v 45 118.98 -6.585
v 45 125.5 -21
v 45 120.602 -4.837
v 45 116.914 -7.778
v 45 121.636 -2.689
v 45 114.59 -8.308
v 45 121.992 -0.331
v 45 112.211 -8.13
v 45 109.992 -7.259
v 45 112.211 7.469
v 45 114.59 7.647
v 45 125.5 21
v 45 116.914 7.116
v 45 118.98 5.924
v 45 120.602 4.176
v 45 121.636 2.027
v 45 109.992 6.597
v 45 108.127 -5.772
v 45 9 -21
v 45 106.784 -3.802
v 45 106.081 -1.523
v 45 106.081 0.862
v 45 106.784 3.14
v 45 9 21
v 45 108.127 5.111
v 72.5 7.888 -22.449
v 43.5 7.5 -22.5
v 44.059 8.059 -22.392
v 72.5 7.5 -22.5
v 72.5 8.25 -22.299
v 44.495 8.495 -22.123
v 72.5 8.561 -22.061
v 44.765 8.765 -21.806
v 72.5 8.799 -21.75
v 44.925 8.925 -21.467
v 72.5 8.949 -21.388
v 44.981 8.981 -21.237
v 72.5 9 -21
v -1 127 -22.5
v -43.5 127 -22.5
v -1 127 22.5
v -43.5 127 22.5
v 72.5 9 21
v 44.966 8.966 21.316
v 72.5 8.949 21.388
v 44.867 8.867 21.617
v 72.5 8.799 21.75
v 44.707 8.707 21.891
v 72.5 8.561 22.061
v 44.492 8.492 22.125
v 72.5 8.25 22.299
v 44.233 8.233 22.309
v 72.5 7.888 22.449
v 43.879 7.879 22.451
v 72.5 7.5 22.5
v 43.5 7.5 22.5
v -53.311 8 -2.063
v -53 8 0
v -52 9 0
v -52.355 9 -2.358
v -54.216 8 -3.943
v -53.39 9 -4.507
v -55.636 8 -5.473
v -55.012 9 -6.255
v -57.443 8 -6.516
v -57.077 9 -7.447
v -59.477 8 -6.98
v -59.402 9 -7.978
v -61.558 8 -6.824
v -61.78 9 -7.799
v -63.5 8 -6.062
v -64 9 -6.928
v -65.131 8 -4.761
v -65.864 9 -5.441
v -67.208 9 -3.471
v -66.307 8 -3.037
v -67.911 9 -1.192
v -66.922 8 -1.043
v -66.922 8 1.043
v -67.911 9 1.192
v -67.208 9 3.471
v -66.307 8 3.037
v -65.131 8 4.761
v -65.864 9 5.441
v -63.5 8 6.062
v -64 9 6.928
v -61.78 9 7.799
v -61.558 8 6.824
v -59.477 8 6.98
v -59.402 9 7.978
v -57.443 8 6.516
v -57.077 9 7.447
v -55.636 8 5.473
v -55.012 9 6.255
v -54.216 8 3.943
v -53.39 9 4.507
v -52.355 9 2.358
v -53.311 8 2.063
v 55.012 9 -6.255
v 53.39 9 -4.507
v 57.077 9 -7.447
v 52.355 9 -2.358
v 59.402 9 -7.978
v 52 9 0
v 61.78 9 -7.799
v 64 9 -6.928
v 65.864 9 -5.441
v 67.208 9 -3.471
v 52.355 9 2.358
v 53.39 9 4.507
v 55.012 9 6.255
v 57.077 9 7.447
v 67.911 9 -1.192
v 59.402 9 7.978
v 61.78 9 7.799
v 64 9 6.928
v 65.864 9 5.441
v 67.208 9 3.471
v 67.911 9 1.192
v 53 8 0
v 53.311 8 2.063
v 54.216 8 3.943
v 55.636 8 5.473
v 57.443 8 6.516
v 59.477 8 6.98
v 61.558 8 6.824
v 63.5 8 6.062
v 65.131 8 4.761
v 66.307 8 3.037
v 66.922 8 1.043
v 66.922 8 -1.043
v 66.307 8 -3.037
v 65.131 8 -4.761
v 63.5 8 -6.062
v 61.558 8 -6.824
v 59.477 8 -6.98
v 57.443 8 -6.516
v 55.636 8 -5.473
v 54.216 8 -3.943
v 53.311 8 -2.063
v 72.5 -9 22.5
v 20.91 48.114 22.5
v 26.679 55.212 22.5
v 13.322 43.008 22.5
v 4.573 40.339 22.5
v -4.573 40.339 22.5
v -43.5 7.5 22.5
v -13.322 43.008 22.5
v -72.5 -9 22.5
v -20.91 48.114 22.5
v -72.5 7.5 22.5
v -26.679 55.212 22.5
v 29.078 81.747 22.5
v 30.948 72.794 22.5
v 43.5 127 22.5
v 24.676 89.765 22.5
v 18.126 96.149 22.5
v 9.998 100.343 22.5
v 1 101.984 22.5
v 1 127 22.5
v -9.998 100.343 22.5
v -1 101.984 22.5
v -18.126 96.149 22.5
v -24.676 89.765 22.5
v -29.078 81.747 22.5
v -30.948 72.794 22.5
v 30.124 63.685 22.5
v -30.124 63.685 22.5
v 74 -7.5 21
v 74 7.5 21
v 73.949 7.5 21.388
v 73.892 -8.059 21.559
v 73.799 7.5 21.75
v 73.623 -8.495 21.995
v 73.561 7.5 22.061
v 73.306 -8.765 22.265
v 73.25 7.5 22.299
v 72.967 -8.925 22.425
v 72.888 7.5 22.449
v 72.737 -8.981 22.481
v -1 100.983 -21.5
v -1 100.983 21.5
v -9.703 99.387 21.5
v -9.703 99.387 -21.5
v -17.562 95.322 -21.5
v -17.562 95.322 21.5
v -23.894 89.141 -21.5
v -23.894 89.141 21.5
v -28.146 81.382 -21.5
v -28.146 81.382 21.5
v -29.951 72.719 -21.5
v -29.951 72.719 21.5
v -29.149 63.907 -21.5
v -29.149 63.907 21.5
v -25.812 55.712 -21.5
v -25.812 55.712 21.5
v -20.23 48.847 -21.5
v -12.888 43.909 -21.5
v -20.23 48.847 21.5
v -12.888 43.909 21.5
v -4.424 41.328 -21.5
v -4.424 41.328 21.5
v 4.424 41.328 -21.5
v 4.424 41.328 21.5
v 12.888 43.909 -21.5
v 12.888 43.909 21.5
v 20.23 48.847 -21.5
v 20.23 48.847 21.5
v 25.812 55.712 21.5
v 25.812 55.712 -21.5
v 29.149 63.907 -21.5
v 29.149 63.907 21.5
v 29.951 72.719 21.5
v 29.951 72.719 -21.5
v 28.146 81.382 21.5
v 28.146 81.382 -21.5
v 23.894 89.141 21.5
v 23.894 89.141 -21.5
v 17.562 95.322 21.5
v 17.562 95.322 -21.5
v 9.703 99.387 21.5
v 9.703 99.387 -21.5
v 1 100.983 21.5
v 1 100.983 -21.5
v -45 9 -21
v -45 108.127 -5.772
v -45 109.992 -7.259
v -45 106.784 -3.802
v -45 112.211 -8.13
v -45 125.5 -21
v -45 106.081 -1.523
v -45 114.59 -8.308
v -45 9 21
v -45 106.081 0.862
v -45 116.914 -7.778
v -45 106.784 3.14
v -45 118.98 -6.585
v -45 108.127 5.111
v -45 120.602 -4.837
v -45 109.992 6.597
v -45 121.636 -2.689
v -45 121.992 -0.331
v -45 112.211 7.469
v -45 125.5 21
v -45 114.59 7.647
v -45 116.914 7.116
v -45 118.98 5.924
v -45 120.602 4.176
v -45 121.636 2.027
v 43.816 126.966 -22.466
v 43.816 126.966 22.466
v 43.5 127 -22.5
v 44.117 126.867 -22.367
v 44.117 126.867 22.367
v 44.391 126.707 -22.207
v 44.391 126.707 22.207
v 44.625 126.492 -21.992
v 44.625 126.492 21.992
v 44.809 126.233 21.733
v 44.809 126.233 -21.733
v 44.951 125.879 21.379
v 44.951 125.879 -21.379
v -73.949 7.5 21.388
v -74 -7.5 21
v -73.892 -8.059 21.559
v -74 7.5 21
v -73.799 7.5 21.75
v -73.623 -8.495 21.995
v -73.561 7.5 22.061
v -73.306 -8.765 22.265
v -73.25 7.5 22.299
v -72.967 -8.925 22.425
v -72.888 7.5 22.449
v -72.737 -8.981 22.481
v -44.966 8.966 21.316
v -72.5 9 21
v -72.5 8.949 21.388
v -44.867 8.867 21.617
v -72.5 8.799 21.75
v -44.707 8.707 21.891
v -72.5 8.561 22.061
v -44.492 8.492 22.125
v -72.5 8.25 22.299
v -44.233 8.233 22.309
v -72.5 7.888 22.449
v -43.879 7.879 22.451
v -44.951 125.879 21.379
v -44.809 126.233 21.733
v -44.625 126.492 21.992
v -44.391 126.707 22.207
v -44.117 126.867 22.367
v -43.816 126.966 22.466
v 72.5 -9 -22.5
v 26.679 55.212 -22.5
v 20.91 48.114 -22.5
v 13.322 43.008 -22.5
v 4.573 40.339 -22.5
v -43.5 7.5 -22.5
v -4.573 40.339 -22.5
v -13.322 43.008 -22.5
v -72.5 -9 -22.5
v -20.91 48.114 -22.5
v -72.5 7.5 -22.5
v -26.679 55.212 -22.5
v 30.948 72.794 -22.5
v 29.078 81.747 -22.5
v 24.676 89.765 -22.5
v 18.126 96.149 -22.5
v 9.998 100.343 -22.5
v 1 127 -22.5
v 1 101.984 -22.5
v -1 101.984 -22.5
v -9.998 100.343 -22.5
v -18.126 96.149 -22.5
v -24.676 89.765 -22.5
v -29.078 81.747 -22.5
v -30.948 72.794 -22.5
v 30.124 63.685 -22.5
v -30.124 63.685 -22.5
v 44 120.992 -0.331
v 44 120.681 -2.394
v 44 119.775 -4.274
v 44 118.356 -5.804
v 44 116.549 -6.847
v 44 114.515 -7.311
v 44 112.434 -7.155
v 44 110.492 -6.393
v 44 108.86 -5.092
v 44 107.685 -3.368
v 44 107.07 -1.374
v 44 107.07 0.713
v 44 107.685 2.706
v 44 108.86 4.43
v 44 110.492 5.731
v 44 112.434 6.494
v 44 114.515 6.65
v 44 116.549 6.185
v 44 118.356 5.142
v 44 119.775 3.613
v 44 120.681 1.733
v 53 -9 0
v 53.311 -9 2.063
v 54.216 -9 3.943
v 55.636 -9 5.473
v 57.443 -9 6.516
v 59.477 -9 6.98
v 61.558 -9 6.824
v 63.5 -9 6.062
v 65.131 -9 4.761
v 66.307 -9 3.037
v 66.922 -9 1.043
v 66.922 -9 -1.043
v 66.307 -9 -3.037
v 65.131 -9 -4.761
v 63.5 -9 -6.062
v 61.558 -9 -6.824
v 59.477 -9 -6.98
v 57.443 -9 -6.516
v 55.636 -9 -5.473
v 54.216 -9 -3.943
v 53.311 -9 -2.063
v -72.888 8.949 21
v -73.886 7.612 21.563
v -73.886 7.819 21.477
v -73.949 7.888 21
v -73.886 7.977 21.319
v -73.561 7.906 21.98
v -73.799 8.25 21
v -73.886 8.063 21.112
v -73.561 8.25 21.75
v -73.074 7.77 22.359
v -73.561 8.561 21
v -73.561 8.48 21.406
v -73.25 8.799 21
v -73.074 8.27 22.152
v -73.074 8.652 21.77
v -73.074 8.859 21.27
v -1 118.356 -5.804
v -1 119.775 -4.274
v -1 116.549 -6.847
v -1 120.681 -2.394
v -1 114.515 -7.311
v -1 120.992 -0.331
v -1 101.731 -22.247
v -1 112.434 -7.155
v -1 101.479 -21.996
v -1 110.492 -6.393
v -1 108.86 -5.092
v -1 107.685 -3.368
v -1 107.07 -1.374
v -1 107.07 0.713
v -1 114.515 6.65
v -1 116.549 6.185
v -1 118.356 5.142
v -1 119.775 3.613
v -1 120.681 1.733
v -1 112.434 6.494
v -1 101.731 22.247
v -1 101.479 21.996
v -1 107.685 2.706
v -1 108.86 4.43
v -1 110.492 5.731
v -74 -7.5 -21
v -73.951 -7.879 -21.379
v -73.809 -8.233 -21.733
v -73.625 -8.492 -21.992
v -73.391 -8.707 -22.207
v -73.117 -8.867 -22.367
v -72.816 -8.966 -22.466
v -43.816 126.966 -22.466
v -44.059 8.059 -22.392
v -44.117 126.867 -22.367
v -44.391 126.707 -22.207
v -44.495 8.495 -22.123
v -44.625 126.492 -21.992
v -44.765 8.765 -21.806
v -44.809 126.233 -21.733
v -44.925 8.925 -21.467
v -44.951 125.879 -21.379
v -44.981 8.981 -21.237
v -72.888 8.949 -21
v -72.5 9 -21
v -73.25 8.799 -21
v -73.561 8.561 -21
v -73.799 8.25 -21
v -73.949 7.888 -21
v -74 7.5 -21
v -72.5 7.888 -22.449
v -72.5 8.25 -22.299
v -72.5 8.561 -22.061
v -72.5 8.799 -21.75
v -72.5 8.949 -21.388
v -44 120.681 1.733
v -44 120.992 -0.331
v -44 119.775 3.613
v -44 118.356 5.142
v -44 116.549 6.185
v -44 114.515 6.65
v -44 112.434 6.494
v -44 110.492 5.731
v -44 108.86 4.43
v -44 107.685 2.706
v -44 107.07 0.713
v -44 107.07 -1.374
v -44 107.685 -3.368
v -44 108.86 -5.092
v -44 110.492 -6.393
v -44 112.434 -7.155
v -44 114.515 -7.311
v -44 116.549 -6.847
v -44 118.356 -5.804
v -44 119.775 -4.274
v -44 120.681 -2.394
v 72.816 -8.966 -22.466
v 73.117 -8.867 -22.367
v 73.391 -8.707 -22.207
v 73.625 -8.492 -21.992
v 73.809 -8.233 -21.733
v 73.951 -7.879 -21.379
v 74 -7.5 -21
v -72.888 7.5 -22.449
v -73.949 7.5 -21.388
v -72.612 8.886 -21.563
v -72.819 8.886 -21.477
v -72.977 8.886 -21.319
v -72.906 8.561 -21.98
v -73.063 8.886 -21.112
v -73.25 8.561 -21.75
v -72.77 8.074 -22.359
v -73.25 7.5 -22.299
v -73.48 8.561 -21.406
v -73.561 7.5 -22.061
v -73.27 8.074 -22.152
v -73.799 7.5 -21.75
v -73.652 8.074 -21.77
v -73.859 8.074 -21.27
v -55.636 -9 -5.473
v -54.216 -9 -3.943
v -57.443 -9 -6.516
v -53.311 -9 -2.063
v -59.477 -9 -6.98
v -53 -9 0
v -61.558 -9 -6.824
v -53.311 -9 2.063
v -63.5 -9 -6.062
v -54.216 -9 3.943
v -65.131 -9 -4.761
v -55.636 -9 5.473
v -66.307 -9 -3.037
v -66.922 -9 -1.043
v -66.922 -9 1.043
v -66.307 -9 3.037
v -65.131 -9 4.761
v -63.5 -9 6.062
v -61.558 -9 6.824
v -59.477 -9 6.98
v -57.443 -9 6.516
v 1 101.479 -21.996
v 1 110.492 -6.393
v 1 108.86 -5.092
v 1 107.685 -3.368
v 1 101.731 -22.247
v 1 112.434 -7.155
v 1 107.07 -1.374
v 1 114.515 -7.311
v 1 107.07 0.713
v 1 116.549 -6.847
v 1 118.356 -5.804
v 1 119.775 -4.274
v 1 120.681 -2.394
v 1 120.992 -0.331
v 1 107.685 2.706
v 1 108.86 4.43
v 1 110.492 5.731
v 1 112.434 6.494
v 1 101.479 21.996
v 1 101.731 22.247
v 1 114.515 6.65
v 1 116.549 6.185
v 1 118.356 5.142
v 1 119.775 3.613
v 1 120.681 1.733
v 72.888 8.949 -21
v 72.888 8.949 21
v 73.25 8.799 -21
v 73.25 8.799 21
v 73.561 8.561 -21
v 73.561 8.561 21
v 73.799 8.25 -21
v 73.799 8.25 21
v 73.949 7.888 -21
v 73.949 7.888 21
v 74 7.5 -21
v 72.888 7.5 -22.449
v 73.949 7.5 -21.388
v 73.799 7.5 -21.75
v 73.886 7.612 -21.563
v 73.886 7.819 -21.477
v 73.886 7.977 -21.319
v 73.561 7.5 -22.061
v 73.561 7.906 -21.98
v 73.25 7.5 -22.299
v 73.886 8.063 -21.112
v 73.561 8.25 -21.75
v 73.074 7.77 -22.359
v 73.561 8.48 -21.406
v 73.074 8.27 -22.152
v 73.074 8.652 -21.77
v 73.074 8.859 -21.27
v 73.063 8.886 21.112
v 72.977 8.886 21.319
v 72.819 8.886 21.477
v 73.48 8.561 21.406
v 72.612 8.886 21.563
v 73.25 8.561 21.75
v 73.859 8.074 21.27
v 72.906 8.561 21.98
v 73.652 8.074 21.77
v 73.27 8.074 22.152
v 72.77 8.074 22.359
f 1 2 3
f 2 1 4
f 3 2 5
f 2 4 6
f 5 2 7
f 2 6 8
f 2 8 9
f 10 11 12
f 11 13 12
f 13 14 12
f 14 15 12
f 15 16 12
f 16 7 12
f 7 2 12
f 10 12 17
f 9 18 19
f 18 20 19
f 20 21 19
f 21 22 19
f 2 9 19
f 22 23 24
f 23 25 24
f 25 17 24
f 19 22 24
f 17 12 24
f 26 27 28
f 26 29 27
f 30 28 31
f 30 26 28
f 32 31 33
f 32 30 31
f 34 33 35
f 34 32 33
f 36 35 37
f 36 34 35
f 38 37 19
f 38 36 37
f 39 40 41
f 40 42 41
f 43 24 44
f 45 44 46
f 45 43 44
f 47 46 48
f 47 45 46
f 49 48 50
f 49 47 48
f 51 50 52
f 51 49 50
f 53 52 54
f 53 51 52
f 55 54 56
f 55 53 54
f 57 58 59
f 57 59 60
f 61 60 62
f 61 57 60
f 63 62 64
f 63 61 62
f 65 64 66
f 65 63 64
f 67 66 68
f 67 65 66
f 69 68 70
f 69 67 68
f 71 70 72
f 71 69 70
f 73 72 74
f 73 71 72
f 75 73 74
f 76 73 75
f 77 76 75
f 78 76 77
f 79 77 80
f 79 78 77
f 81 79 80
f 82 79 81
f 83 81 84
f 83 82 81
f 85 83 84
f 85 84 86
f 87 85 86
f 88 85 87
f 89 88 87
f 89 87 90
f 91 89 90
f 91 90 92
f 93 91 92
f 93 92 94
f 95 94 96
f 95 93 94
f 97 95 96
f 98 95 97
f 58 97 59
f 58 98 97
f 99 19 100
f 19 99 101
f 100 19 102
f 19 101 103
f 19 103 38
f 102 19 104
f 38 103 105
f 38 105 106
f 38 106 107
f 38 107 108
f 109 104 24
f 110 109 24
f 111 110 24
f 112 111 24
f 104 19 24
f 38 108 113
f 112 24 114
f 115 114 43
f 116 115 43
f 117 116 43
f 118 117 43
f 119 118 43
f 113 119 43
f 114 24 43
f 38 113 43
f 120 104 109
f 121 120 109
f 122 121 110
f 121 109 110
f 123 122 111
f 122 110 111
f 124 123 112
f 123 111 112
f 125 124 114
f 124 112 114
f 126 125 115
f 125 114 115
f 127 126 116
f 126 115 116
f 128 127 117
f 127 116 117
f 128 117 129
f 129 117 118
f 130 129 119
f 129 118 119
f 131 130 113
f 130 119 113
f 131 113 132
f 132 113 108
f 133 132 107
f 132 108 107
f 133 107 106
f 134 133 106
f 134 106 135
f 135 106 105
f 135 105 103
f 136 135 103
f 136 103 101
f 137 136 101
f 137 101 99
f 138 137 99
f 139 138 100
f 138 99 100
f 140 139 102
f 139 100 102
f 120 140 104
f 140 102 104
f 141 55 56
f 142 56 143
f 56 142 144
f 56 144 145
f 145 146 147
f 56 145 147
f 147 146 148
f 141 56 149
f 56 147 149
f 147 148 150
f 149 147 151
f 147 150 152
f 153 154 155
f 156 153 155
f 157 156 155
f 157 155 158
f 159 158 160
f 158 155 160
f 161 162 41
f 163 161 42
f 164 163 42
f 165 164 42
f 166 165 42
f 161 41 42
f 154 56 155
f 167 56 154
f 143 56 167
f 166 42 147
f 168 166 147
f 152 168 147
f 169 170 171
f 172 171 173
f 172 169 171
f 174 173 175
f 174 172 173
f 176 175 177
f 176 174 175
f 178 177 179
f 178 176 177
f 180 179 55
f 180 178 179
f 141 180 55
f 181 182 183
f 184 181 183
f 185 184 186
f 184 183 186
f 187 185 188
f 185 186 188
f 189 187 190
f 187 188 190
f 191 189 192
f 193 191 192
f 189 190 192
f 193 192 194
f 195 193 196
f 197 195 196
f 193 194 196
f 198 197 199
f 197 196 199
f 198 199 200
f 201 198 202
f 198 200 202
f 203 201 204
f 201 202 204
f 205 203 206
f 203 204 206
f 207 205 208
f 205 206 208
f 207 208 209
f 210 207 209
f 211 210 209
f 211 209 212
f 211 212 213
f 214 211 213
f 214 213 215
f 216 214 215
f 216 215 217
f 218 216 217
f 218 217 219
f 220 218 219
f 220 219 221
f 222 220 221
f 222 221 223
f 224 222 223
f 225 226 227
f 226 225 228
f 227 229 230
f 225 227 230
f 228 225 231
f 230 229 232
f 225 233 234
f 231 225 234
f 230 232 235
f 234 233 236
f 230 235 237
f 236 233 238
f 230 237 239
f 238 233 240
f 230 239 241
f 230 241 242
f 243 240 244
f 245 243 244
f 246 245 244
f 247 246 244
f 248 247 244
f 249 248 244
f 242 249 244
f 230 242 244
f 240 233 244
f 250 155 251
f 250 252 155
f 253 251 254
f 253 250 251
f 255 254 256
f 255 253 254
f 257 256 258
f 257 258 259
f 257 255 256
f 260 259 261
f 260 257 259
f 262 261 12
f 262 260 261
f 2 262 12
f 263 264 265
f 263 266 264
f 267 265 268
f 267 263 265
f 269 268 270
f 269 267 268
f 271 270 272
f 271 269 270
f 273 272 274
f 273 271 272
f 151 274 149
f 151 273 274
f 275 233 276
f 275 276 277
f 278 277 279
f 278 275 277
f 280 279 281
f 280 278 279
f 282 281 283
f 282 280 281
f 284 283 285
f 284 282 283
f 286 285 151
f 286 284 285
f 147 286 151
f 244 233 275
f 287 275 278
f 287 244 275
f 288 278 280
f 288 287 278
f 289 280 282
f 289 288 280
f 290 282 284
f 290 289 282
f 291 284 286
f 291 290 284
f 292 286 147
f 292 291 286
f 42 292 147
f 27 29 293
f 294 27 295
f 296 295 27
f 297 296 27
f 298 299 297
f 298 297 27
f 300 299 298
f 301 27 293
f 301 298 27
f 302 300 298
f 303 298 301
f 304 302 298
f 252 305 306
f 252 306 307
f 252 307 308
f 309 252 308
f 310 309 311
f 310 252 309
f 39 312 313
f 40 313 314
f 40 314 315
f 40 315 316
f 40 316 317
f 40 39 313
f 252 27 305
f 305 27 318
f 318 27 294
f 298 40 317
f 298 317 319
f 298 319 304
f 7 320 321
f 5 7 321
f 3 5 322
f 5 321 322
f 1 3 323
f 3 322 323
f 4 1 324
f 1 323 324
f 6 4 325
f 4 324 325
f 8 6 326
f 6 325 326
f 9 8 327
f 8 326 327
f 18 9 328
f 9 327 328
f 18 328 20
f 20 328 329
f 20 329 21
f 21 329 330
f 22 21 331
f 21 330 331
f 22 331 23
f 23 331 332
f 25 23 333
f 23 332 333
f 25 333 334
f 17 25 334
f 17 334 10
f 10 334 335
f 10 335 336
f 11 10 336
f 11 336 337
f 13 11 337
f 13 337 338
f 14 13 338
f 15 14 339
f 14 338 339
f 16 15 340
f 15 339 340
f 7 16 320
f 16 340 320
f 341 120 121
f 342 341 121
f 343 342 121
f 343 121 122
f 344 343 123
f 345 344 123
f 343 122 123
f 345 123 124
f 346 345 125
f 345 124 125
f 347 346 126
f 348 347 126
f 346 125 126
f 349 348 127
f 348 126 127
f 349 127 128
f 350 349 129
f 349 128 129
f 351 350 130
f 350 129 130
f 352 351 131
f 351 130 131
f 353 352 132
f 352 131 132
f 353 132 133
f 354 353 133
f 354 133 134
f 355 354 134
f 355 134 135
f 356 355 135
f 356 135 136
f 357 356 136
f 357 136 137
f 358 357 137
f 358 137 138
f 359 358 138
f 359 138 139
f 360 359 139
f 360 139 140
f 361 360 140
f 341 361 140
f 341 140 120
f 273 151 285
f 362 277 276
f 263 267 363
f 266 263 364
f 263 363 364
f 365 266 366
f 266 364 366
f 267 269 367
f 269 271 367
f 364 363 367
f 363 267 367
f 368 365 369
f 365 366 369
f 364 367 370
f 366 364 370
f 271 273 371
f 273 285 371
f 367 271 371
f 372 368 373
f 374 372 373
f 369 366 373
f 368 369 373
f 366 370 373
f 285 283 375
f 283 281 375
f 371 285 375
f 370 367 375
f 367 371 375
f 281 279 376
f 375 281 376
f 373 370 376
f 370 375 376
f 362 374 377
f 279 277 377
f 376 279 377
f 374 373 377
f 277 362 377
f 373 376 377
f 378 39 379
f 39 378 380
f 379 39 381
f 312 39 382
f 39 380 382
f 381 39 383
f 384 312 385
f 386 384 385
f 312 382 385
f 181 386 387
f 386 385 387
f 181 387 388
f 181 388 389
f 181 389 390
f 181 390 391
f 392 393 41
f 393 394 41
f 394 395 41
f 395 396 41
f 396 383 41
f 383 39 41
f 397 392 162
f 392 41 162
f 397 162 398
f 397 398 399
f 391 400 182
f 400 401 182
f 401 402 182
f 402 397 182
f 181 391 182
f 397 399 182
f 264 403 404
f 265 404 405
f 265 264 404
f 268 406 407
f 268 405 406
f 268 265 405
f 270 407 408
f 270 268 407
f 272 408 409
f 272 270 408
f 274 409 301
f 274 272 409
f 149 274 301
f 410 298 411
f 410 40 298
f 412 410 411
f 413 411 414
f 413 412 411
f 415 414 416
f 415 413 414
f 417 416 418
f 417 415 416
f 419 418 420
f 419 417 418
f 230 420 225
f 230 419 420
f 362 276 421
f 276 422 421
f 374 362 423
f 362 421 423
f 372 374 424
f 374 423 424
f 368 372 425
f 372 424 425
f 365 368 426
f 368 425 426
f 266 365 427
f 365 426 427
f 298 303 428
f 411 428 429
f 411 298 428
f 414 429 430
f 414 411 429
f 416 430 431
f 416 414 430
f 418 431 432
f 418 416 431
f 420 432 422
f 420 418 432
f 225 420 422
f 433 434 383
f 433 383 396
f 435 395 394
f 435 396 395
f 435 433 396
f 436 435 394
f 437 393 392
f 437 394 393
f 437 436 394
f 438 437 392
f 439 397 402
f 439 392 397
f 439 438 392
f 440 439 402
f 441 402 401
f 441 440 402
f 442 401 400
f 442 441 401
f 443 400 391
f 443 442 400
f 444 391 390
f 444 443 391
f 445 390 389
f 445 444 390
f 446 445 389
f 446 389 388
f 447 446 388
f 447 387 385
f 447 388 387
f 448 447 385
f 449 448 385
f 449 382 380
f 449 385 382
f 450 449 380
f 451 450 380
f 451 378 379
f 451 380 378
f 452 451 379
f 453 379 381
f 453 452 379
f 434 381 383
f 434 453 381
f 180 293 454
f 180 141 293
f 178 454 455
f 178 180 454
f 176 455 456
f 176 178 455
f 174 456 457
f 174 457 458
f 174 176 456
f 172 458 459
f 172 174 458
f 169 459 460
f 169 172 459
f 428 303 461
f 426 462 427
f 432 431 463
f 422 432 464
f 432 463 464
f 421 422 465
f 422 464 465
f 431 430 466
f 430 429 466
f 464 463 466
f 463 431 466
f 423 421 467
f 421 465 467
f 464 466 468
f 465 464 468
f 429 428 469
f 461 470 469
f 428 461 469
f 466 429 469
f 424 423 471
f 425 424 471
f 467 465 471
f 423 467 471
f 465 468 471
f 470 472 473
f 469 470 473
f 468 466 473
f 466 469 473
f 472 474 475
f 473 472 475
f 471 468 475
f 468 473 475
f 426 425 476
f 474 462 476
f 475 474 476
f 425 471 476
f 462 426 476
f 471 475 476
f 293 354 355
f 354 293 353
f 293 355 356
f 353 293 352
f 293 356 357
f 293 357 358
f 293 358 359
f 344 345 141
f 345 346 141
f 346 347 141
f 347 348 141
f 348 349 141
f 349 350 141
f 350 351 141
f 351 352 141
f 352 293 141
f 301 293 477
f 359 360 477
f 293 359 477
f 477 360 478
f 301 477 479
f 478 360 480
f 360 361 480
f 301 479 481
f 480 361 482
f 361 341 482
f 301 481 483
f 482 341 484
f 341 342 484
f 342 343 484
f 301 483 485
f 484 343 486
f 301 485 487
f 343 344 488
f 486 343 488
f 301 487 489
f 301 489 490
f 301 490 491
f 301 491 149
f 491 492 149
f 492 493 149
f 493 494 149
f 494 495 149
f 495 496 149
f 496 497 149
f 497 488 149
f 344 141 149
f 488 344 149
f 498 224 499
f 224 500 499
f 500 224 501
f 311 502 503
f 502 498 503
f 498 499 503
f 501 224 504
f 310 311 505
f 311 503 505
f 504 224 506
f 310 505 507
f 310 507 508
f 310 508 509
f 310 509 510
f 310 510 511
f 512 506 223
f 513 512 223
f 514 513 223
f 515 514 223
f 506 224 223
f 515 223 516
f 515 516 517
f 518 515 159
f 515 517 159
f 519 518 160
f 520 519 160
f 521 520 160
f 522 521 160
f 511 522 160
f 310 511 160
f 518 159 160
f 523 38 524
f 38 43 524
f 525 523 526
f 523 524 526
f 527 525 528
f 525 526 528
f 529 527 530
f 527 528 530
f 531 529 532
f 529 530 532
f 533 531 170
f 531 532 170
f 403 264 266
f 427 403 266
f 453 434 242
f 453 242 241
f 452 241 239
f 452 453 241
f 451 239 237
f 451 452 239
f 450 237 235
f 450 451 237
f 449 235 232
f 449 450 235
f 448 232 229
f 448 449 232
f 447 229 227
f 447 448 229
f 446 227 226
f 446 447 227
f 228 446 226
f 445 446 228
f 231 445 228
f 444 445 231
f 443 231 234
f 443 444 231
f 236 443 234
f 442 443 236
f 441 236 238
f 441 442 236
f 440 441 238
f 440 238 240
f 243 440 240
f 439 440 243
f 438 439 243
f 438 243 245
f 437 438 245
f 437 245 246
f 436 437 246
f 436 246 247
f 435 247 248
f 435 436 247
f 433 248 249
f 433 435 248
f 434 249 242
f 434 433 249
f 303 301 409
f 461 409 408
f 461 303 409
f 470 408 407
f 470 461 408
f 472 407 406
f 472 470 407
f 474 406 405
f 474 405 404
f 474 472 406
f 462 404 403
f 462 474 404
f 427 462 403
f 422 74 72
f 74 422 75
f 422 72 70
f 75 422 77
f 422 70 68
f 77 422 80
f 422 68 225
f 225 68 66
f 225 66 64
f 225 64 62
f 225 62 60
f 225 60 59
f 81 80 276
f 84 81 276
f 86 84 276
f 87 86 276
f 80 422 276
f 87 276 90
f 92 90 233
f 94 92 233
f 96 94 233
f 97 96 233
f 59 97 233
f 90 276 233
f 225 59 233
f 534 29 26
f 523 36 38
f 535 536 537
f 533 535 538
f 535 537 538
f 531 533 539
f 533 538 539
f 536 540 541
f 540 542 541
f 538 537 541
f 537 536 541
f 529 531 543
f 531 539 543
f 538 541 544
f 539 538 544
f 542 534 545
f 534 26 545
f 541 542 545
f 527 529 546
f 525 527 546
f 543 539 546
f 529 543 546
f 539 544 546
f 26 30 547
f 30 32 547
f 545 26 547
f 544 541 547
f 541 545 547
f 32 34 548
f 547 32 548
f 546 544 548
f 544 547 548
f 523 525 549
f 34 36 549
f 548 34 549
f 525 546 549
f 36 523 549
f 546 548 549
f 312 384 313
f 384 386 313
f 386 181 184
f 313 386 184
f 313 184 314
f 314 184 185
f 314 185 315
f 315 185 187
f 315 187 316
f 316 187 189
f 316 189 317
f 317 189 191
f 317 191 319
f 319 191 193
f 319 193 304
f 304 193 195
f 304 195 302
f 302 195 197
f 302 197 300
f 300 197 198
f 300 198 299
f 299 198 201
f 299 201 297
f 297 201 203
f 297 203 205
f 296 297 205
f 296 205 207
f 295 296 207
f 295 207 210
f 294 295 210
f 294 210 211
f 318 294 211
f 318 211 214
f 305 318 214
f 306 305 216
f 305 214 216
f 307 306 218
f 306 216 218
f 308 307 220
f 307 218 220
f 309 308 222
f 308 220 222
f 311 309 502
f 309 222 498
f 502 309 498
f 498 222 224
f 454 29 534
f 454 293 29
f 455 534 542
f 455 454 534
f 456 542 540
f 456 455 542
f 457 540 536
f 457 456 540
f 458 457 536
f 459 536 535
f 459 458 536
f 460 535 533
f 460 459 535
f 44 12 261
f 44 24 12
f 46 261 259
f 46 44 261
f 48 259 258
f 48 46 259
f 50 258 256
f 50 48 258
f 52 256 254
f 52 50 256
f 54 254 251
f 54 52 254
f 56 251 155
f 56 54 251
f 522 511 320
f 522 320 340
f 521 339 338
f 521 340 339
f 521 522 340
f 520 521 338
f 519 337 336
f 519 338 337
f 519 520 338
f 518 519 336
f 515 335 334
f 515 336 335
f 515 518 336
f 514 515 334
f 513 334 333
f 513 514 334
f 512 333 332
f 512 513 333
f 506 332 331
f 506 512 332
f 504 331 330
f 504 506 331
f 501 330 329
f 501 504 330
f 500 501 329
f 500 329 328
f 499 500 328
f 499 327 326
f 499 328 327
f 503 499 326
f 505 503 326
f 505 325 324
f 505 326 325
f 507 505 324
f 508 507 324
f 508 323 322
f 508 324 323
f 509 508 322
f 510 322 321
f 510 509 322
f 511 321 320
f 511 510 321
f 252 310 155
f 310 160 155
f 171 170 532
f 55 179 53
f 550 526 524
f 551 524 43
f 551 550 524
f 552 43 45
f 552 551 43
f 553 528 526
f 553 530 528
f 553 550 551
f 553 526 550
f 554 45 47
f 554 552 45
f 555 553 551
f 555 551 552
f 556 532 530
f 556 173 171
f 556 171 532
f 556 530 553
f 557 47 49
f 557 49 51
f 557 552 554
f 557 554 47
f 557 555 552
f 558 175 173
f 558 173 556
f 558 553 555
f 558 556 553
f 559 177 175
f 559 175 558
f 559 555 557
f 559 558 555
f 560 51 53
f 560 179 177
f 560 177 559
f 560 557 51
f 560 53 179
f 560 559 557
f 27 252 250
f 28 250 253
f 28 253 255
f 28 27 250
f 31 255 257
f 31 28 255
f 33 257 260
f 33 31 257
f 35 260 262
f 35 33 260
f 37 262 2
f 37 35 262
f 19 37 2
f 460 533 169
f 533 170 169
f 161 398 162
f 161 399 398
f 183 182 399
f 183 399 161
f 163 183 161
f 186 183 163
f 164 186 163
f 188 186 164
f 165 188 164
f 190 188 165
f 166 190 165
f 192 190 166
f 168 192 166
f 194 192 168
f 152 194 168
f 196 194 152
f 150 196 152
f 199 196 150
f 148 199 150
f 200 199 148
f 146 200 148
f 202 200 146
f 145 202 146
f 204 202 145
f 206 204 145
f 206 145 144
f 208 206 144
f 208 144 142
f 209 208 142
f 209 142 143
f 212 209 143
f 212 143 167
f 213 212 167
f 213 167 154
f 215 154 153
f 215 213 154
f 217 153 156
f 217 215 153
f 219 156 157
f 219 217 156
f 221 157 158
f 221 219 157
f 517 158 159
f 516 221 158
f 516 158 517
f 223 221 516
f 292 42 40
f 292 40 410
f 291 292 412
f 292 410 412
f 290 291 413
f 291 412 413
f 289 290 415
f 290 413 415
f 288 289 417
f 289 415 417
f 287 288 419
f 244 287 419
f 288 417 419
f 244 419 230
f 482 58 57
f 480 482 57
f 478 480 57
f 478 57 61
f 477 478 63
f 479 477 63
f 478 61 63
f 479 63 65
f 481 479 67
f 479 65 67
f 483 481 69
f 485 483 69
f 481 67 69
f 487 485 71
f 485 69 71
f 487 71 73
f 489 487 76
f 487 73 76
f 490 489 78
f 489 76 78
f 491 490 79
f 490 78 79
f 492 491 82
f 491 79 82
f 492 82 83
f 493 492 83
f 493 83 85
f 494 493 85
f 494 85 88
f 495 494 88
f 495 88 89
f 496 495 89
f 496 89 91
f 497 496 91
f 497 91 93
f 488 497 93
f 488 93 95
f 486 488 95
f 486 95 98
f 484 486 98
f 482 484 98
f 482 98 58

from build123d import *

# Parameters (mm, degrees)
BOSS_EXTRUDE1_DEPTH     = 22.5
SKETCH2_R               = 7
CUT_EXTRUDE1_DEPTH      = 142.089510595
CUT_EXTRUDE2_DEPTH      = 150.198693024
CUT_EXTRUDE2_DEPTH_BACK = 150.198693024
SKETCH5_R               = 7
CHAMFER2_SIZE           = 1
FILLET2_R               = 1.5


with BuildPart() as part:
    # Sketch1 → Boss-Extrude1 (new, symmetric)
    with BuildSketch(Plane.XY):
        with BuildLine():
            Line((-74, -9), (-74, 9))
            Line((-74, 9), (-45, 9))
            Line((-45, 9), (-45, 127))
            Line((-45, 127), (-1, 127))
            Line((-1, 127), (-1, 100.983328701))
            ThreePointArc((-1, 100.983328701), (0, 41), (1, 100.983328701))
            Line((1, 100.983328701), (1, 127))
            Line((1, 127), (45, 127))
            Line((45, 127), (45, 9))
            Line((45, 9), (74, 9))
            Line((74, 9), (74, -9))
            Line((74, -9), (-74, -9))
        make_face()
    extrude(amount=BOSS_EXTRUDE1_DEPTH, both=True)

    # Sketch2 → Cut-Extrude1 (cut, through all)
    with BuildSketch(Plane(origin=(0, 9, 0), x_dir=(1, 0, 0), z_dir=(0, 1, 0))):
        with Locations(Location((60, 0, 0), (0, 0, 180))):
            Circle(SKETCH2_R)
        with Locations((-60, 0)):
            Circle(SKETCH2_R)
    extrude(amount=-CUT_EXTRUDE1_DEPTH, mode=Mode.SUBTRACT)

    # Sketch5 → Cut-Extrude2 (cut, two sides: drawn at the far end of the back side and taken through both)
    with BuildSketch(Plane(origin=(-1, 0, 0), x_dir=(0, 0, -1), z_dir=(1, 0, 0)).offset(-CUT_EXTRUDE2_DEPTH_BACK)):
        with Locations(Location((0.330734984, 113.991664351, 0), (0, 0, 90))):
            Circle(SKETCH5_R)
    extrude(amount=CUT_EXTRUDE2_DEPTH + CUT_EXTRUDE2_DEPTH_BACK, mode=Mode.SUBTRACT)

    # Chamfer2
    chamfer2_edges = [part.edges().sort_by_distance(p)[0] for p in [
        (0, 41, -22.5),
        (0, 41, 22.5),
        (67, 9, 0),
        (-67, 9, 0),
        (-45, 106.991664351, -0.330734984),
        (45, 106.991664351, -0.330734984),
    ]]
    chamfer(chamfer2_edges, length=CHAMFER2_SIZE)

    # Fillet2
    fillet2_edges = [part.edges().sort_by_distance(p)[0] for p in [
        (-59.5, 9, 22.5),
        (45, 68, -22.5),
        (59.5, 9, -22.5),
        (-74, 0, 22.5),
        (74, 0, -22.5),
        (-74, 0, -22.5),
        (-59.5, 9, -22.5),
        (-45, 68, -22.5),
        (74, 0, 22.5),
        (45, 127, 0),
        (74, 9, 0),
        (74, -9, 0),
        (-74, -9, 0),
        (-74, 9, 0),
        (-45, 127, 0),
        (59.5, 9, 22.5),
        (45, 68, 22.5),
        (-45, 68, 22.5),
    ]]
    fillet(fillet2_edges, radius=FILLET2_R)


solid = part.part
